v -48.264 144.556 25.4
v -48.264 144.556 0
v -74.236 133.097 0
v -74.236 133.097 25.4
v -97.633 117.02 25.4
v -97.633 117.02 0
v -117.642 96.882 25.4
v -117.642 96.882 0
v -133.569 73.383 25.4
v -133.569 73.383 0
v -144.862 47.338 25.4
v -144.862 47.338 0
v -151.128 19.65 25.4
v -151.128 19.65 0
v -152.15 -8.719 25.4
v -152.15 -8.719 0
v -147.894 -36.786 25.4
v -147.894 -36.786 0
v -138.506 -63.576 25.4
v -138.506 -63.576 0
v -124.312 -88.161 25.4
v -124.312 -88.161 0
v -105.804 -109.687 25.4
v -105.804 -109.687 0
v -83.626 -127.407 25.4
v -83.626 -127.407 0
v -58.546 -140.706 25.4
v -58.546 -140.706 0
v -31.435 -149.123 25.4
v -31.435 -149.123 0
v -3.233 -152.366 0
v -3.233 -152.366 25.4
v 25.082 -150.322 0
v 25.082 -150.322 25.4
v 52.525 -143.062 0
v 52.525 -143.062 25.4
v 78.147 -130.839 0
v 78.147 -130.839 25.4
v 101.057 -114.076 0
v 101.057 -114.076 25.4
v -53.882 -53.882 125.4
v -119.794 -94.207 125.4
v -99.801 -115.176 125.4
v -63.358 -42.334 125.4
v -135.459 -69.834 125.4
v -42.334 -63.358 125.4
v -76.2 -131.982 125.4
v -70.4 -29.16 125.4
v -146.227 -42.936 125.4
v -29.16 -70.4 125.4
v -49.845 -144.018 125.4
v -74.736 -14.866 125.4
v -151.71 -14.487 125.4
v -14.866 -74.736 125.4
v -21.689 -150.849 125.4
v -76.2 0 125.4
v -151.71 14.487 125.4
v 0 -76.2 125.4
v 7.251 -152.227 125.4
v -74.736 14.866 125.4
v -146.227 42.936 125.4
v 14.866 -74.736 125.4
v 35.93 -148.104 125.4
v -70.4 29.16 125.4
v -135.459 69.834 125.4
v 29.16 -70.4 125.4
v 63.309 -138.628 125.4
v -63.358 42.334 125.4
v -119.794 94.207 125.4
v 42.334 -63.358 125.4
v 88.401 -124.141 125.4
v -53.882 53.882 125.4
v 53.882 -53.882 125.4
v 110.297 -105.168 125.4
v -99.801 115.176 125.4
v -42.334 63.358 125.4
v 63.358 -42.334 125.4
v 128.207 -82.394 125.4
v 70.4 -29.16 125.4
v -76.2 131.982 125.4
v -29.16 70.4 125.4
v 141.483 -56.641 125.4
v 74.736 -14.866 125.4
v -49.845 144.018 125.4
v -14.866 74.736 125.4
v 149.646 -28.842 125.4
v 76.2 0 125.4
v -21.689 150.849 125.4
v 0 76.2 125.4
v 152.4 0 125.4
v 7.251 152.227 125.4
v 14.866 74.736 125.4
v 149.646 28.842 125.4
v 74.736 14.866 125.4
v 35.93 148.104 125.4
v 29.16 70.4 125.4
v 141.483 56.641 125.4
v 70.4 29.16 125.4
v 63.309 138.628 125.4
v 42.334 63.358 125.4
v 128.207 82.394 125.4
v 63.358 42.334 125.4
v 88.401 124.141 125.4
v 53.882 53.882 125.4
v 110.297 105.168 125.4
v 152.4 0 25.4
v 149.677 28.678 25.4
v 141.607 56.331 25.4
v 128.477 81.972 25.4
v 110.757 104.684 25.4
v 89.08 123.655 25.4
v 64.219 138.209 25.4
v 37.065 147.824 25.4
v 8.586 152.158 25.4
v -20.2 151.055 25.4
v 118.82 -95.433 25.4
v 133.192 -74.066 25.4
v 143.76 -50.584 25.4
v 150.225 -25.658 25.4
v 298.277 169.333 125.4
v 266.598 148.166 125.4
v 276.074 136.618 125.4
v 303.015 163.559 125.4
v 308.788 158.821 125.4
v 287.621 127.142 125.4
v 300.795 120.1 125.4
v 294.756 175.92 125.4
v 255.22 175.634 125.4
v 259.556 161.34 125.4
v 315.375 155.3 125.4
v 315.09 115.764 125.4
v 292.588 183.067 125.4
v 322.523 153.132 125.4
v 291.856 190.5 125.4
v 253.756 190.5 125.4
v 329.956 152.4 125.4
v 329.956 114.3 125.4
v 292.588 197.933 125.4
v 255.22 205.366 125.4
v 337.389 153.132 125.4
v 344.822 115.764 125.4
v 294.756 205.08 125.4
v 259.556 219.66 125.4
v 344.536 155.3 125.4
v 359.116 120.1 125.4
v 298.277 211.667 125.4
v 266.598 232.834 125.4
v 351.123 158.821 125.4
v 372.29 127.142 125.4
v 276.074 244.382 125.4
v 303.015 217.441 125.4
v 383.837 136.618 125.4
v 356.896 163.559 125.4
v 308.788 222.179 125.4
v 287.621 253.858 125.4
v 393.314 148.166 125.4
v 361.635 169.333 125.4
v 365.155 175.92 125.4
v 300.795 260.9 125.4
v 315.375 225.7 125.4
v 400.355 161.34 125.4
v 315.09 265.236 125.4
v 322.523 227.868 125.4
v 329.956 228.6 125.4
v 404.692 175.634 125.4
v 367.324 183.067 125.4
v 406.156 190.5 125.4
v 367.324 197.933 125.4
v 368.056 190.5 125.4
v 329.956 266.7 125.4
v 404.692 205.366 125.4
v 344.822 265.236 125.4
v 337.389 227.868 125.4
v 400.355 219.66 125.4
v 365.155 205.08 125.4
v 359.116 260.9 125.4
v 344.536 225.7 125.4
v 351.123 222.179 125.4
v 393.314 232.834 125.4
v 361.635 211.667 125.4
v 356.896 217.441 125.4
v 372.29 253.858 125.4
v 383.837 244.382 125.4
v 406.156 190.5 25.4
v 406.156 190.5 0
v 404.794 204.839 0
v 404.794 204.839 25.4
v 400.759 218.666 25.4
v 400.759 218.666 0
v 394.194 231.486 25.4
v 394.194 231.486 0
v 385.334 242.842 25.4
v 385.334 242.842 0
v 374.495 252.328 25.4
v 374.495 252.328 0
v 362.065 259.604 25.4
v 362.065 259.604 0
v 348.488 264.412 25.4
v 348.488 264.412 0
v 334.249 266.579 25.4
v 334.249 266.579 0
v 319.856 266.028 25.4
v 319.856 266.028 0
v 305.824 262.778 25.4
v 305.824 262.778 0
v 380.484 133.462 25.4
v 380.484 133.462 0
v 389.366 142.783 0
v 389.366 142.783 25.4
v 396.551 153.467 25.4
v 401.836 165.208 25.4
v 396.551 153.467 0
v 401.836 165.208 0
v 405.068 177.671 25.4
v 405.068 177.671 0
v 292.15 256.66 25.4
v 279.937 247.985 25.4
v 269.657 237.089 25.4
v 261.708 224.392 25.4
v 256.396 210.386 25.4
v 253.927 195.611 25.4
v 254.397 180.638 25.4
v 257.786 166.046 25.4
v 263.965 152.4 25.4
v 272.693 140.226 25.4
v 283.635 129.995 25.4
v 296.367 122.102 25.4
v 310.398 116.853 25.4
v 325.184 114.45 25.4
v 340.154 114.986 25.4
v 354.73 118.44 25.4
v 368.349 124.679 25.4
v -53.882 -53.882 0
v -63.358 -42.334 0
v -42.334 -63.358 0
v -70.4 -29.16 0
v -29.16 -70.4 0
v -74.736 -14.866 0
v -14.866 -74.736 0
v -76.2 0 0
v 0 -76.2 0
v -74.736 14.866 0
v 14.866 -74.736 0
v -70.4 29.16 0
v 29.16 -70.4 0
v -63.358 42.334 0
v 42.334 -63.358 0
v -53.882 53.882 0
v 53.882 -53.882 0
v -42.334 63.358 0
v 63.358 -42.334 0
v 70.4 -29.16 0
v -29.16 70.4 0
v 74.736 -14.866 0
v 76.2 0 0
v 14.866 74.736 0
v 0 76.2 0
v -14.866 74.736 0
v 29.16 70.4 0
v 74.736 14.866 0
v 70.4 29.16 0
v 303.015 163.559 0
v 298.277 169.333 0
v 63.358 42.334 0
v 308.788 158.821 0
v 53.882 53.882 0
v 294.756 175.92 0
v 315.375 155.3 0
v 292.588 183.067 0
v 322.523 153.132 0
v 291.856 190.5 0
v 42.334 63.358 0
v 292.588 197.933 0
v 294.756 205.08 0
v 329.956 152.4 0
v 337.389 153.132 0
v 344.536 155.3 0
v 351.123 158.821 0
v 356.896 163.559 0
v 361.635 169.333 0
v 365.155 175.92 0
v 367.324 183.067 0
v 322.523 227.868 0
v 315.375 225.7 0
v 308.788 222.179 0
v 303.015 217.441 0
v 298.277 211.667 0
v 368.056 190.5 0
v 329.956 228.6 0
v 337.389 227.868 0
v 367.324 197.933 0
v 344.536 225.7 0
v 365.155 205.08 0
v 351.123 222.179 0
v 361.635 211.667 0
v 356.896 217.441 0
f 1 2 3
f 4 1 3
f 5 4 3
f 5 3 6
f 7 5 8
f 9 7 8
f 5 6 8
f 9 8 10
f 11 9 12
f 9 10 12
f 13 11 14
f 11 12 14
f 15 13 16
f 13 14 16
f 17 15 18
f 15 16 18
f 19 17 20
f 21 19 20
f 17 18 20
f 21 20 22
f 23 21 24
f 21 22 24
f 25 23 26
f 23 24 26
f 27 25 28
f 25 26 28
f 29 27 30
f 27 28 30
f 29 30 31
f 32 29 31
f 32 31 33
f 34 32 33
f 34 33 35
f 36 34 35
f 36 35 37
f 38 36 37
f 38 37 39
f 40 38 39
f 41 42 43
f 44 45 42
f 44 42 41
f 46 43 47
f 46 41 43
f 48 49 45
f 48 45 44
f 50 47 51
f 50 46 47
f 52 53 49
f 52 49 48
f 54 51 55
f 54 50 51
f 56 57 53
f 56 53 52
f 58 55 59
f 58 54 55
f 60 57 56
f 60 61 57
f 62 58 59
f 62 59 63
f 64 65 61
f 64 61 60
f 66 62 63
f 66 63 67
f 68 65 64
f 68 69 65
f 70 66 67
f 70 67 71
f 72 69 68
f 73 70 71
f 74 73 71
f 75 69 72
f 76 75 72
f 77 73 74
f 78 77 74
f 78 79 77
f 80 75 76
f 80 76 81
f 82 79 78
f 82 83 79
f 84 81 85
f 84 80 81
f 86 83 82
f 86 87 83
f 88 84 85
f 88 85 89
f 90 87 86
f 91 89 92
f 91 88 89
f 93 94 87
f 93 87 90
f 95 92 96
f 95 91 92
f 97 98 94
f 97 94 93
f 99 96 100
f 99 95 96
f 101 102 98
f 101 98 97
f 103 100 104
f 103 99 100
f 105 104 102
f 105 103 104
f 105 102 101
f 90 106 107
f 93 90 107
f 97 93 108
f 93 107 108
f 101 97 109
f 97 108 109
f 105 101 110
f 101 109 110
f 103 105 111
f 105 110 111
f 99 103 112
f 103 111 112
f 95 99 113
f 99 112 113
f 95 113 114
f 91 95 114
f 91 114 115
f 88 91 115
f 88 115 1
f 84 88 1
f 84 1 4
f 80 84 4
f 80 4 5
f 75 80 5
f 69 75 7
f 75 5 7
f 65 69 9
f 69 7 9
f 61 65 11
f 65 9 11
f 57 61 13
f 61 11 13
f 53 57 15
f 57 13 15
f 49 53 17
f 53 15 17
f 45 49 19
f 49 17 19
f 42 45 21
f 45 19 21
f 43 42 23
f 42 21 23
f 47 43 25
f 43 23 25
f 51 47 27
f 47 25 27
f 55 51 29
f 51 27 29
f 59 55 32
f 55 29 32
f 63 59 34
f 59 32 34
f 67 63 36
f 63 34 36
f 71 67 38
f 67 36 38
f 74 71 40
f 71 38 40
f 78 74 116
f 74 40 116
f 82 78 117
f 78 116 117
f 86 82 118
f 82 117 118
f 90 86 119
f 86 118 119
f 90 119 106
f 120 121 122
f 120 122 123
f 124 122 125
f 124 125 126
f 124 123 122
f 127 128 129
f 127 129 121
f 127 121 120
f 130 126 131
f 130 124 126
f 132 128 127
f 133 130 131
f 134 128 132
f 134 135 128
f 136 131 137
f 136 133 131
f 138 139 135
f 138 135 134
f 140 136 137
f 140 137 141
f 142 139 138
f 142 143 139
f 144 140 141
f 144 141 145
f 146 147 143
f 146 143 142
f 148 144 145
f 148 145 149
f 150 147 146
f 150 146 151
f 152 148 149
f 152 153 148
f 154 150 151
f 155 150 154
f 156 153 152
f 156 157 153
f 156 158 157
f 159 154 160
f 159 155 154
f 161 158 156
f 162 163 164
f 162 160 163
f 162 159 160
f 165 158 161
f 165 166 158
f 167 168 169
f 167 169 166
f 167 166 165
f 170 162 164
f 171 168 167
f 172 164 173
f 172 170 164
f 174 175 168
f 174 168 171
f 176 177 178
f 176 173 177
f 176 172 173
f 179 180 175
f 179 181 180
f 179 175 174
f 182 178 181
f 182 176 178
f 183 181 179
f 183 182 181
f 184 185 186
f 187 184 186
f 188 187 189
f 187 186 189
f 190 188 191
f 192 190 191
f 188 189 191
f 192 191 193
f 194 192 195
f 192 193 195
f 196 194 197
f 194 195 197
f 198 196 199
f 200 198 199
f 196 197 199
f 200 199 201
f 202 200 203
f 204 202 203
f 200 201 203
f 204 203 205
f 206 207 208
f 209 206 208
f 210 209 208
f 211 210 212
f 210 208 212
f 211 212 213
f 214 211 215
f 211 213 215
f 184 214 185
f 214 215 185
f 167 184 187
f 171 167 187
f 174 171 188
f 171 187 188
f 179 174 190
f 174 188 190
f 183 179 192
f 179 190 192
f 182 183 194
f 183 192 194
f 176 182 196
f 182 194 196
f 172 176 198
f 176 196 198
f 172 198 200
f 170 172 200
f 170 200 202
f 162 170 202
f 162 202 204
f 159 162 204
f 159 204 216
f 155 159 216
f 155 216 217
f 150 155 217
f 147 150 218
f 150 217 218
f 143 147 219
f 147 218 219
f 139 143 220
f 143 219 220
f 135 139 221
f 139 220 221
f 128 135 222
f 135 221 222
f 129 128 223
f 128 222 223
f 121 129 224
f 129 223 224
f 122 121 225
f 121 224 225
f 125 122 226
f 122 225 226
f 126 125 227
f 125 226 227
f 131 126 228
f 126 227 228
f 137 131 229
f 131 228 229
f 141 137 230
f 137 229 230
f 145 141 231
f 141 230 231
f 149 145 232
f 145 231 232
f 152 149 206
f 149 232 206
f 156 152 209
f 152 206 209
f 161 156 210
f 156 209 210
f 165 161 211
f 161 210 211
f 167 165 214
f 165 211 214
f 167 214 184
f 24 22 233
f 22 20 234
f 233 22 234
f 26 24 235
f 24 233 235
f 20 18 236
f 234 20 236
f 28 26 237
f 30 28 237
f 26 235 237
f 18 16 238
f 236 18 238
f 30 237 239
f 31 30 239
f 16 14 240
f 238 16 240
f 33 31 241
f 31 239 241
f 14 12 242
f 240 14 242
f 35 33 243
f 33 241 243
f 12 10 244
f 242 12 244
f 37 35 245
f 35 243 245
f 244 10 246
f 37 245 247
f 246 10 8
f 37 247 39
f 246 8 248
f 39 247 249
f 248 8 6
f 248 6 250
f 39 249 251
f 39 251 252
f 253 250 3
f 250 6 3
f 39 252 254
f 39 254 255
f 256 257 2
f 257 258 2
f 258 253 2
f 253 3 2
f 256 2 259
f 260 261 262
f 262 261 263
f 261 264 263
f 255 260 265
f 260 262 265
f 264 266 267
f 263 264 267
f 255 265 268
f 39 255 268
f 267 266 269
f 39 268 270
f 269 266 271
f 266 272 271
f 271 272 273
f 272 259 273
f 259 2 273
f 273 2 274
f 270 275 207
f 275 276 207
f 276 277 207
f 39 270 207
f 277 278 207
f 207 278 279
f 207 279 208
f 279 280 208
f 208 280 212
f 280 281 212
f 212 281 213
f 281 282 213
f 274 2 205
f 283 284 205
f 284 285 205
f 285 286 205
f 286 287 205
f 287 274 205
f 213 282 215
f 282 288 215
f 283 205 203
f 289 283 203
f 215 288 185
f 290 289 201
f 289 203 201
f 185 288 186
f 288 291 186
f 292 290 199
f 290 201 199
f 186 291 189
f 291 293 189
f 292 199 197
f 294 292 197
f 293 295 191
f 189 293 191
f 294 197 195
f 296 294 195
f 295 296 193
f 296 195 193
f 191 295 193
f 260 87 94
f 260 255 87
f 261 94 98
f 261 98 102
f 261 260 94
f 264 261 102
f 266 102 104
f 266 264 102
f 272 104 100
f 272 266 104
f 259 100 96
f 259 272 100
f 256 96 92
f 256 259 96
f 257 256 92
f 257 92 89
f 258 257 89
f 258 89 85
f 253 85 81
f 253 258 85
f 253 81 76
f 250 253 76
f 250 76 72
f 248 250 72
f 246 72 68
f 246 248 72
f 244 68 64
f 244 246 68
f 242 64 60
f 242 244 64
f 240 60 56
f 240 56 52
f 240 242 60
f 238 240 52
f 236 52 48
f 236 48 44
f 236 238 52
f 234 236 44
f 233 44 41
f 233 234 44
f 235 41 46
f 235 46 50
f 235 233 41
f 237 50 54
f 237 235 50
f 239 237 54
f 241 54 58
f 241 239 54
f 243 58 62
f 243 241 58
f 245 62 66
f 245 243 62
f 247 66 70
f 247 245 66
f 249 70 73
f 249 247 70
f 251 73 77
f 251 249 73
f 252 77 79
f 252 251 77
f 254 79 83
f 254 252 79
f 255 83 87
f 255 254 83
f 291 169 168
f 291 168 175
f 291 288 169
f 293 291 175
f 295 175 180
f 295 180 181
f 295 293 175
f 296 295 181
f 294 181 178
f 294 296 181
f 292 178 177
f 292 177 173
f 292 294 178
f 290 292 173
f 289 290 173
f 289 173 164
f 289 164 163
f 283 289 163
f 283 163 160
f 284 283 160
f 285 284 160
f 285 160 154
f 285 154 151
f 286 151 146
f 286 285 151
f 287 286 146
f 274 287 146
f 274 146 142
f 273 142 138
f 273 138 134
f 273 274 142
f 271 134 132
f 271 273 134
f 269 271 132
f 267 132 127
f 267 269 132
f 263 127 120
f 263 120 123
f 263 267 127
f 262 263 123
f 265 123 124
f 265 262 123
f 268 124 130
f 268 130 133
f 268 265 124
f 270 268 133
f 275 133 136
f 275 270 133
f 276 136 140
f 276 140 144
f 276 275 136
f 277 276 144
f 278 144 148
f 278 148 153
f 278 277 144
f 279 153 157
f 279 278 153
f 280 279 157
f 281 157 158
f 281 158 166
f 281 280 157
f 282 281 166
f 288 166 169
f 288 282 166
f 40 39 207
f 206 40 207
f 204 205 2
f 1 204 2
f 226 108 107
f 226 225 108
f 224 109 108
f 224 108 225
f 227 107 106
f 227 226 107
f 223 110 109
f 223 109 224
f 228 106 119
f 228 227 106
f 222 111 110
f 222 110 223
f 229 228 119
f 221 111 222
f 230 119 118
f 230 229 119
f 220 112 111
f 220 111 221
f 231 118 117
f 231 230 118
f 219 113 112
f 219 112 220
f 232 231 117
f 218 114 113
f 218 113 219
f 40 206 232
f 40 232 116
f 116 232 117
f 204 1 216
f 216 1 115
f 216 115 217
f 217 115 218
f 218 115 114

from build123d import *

# Parameters (mm, degrees)
F0_R     = 76.2
F0_R_2   = 38.1
F1_DEPTH = 25.4
F2_R     = 152.4
F2_R_2   = 76.2
F3_DEPTH = 100
F4_R     = 76.2
F4_R_2   = 38.1
F5_DEPTH = 100


with BuildPart() as f1:
    # F0 (on Top) → F1 (new body)
    with BuildSketch(Plane.XY):
        with BuildLine():
            ThreePointArc((101.056902, -114.075688), (138.972716, -62.548734), (152.4, 0))
            ThreePointArc((152.4, 0), (89.079536, 123.655151), (-48.263993, 144.555688))
            ThreePointArc((-48.263993, 144.555688), (-131.982272, -76.2), (101.056902, -114.075688))
        make_face()
        Circle(F0_R, mode=Mode.SUBTRACT)
        with BuildLine():
            ThreePointArc((-48.263993, 144.555688), (89.079536, 123.655151), (152.4, 0))
            ThreePointArc((152.4, 0), (138.972716, -62.548734), (101.056902, -114.075688))
            Line((101.056902, -114.075688), (380.48413, 133.462156))
            ThreePointArc((380.48413, 133.462156), (263.964543, 152.4), (305.823682, 262.777844))
            Line((305.823682, 262.777844), (-48.263993, 144.555688))
        make_face()
        with BuildLine():
            ThreePointArc((406.155679, 190.5), (374.495447, 252.327575), (305.823682, 262.777844))
            ThreePointArc((305.823682, 262.777844), (263.964543, 152.4), (380.48413, 133.462156))
            ThreePointArc((380.48413, 133.462156), (399.442037, 159.225633), (406.155679, 190.5))
        make_face()
        with Locations((329.955679, 190.5)):
            Circle(F0_R_2, mode=Mode.SUBTRACT)
    extrude(amount=F1_DEPTH)

    # F2 (on face) → F3 (join)
    with BuildSketch(Plane.XY.offset(25.4)):
        Circle(F2_R)
        Circle(F2_R_2, mode=Mode.SUBTRACT)
    extrude(amount=F3_DEPTH)

    # F4 (on face) → F5 (join, through all)
    with BuildSketch(Plane.XY.offset(25.4)):
        with Locations((329.955679, 190.5)):
            Circle(F4_R)
        with Locations((329.955679, 190.5)):
            Circle(F4_R_2, mode=Mode.SUBTRACT)
    extrude(amount=F5_DEPTH)


solid = f1.part
